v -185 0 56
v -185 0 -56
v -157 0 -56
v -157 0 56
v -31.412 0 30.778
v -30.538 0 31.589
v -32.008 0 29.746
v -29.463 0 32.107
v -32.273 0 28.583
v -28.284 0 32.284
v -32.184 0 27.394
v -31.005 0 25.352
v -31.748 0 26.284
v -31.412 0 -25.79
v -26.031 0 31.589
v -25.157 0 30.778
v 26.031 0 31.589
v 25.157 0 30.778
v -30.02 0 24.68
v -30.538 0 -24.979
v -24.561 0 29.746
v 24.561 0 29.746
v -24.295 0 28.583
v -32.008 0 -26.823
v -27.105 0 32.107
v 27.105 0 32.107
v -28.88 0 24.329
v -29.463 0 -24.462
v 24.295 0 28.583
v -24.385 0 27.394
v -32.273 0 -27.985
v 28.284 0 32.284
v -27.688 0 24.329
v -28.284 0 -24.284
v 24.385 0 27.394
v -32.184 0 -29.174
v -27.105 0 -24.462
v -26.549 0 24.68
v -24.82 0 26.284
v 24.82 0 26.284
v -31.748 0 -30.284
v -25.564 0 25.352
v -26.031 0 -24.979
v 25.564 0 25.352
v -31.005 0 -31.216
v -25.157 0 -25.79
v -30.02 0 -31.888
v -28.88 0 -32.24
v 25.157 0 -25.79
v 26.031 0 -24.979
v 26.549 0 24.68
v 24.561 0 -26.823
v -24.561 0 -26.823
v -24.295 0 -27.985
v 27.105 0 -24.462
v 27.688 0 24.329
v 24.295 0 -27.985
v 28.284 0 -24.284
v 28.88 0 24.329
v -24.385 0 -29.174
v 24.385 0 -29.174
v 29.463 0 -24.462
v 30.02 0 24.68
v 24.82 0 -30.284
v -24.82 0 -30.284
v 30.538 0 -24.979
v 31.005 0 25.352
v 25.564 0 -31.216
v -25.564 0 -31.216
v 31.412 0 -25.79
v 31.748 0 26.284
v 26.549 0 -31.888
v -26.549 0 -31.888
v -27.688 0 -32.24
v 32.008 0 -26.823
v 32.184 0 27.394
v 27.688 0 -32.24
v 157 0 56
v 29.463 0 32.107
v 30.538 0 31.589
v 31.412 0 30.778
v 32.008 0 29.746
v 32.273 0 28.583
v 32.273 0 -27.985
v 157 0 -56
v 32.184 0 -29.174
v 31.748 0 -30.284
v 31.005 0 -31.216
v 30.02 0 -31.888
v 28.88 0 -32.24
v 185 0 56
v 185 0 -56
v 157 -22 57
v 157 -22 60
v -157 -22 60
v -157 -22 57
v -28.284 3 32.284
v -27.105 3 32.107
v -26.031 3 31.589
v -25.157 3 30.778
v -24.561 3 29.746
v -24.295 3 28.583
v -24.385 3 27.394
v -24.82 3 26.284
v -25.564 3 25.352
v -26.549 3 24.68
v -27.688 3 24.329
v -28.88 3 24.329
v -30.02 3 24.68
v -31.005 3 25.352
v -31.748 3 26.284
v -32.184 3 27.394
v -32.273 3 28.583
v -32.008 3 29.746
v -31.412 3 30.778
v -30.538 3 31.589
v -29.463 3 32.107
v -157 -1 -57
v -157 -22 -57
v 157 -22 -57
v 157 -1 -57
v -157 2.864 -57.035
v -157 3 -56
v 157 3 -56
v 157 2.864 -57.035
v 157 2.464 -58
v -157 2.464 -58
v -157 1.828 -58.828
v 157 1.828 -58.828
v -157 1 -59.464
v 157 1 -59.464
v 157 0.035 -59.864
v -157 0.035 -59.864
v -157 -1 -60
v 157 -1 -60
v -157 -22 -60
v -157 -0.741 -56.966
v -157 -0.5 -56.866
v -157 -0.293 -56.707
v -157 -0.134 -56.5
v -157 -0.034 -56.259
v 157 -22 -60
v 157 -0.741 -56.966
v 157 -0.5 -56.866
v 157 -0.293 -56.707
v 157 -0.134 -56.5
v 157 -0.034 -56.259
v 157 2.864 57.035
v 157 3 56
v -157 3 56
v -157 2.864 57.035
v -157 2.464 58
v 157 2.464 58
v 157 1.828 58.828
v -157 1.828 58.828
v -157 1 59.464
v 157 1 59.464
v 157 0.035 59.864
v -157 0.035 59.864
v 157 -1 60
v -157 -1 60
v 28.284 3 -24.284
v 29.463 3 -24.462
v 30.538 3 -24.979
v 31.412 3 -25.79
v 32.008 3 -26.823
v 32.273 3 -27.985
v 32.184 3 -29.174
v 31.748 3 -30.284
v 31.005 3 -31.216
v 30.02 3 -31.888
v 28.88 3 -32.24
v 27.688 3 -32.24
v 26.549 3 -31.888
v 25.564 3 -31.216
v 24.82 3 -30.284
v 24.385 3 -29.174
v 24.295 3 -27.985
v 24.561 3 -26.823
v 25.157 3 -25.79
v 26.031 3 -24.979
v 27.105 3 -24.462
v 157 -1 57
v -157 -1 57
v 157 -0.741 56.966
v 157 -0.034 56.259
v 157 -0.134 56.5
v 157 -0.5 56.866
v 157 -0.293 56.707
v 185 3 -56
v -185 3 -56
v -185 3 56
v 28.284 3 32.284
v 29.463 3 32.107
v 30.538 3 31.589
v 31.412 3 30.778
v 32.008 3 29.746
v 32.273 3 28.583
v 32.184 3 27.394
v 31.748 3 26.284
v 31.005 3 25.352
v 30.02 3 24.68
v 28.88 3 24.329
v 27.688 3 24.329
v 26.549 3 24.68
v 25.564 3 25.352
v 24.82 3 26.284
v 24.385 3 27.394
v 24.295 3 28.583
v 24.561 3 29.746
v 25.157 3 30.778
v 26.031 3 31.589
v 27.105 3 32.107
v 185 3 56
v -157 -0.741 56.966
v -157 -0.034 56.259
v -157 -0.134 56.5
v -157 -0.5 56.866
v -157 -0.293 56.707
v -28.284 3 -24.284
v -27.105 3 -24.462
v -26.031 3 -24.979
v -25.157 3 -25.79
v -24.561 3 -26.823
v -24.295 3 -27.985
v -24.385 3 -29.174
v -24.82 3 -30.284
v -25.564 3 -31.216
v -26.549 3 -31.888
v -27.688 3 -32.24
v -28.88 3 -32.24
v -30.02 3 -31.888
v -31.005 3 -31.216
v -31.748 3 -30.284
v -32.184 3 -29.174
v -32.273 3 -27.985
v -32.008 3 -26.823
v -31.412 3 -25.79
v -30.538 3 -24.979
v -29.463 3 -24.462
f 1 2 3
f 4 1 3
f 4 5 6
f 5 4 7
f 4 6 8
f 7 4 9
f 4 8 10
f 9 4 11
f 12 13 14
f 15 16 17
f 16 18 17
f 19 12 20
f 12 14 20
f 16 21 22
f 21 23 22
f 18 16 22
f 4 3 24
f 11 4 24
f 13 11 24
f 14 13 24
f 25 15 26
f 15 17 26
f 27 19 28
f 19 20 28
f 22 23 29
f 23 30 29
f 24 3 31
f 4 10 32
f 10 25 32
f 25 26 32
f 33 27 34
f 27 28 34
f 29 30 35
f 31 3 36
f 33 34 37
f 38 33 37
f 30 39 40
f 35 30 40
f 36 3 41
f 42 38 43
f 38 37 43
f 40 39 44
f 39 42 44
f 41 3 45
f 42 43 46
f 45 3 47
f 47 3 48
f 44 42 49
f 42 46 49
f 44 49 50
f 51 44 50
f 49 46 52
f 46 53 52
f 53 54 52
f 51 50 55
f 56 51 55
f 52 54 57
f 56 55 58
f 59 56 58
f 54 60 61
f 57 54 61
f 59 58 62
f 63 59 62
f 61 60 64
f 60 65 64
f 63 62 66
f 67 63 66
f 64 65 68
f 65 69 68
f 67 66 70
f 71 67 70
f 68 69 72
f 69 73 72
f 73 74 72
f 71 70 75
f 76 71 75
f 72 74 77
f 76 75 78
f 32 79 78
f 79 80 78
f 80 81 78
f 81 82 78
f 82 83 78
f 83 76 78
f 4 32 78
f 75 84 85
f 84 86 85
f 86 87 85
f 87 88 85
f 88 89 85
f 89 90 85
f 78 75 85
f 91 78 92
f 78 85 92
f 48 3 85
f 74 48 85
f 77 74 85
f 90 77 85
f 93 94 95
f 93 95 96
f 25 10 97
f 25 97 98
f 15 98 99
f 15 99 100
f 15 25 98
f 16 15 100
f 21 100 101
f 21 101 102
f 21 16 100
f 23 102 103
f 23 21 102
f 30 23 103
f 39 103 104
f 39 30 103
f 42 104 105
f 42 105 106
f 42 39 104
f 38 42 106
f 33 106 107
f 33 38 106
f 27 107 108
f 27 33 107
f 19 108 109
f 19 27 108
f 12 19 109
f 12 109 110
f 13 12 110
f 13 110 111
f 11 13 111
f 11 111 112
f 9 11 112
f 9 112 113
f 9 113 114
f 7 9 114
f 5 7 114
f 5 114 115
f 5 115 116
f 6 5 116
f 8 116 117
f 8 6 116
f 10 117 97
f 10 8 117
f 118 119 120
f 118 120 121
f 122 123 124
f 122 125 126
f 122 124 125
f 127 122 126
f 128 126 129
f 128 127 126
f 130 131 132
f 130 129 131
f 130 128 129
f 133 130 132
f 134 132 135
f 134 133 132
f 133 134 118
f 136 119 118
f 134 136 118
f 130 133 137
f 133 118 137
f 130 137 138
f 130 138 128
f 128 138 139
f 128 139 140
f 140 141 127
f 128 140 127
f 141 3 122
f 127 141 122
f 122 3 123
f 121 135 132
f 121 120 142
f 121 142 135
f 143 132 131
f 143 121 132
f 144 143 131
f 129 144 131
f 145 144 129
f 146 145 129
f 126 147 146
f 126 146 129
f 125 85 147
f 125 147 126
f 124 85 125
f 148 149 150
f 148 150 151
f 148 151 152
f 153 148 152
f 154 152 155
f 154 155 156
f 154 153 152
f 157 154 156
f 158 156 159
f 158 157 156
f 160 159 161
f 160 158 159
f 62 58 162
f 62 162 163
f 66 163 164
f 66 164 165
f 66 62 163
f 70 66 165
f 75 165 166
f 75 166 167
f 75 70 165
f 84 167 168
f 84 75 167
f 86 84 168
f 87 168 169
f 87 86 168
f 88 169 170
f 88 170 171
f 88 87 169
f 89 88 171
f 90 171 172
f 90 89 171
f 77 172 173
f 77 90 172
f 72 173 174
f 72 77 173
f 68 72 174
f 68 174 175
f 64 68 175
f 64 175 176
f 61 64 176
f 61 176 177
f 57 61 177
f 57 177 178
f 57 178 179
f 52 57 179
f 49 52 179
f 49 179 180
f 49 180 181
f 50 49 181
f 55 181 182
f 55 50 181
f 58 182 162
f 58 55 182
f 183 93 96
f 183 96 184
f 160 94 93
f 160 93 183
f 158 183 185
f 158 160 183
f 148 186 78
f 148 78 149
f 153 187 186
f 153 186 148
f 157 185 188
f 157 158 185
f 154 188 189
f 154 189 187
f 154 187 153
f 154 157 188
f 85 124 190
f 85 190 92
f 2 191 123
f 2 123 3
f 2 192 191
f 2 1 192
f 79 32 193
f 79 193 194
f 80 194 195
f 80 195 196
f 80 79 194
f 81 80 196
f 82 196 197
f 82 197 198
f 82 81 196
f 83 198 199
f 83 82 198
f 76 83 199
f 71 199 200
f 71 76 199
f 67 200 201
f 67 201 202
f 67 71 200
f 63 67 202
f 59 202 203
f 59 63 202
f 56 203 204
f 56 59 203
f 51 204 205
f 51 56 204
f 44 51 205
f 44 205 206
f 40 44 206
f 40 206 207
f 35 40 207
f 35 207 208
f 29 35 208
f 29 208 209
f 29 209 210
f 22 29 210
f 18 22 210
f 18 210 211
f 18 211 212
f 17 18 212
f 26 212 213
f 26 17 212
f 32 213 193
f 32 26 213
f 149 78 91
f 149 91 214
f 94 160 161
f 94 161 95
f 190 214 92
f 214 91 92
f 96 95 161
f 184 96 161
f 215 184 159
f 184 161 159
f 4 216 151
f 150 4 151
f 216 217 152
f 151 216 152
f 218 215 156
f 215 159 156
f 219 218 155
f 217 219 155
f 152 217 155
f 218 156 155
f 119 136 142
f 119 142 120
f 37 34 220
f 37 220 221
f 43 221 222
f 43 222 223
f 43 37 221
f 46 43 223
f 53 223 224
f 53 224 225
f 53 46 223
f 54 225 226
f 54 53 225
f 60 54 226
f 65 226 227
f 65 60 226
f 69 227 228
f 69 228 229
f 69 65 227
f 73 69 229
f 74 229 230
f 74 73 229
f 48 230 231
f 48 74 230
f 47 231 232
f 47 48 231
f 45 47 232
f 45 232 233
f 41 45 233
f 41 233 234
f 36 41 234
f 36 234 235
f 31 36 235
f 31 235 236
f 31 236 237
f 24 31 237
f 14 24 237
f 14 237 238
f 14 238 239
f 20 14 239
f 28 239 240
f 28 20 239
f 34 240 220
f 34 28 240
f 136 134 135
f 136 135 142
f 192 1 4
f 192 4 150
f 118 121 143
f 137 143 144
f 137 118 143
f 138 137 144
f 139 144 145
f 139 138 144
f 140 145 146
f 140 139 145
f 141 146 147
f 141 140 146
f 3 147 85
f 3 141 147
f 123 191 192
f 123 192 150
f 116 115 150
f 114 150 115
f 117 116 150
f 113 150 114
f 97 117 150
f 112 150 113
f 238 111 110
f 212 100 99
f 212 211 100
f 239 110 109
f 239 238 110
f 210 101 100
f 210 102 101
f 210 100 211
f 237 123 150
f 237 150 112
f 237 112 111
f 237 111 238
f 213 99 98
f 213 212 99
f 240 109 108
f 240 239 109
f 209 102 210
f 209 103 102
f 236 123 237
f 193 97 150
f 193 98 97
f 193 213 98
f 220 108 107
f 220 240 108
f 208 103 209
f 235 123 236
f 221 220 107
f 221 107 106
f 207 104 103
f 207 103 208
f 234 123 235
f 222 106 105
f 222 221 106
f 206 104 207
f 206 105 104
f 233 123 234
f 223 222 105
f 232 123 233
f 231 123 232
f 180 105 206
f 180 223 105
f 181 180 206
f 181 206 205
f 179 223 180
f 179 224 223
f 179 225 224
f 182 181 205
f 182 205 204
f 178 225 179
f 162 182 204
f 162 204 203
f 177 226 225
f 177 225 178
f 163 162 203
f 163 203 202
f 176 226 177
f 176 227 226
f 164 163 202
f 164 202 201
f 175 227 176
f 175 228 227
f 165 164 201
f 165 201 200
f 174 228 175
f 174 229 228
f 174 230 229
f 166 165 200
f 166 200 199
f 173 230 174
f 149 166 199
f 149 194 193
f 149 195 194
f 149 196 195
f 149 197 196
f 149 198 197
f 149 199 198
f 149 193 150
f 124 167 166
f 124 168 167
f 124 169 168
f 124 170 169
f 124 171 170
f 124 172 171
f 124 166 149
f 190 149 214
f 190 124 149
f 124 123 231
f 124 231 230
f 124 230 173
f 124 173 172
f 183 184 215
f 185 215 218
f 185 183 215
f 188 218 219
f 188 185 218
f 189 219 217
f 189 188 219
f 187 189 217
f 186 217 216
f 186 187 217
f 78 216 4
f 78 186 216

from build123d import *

# Parameters (mm, degrees)
SKETCH1_W                      = 370
SKETCH1_H                      = 114
SKETCH1_R                      = 4
BOSS_EXTRUDE1_DEPTH            = 3
EDGE_FLANGE1_STRIP_W           = 14
EDGE_FLANGE1_STRIP_H           = 3
EDGE_FLANGE1_STRIP_CUT_DEPTH   = 370
EDGE_FLANGE1_STRIP_2_W         = 14
EDGE_FLANGE1_STRIP_2_H         = 3
EDGE_FLANGE1_STRIP_CUT_2_DEPTH = 370
EDGE_FLANGE1_DEPTH             = 370
EDGE_FLANGE1_BEND_DEPTH        = 370
CUT_EXTRUDE2_START             = -185
CUT_EXTRUDE2_DEPTH             = 28
CUT_EXTRUDE2_START_2           = 157
CUT_EXTRUDE2_2_DEPTH           = 28


# Read off the part's stored shape, not the designer's step: Cut-Extrude2
# Sheet-metal steps are written as plain solids
with BuildPart() as part:
    # Sketch1 → Boss-Extrude1 (new body)
    with BuildSketch(Plane(origin=(0, 0, 0), x_dir=(1, 0, 0), z_dir=(0, 1, 0))):
        Rectangle(SKETCH1_W, SKETCH1_H)
        with Locations(Location((-28.284271247, 28.284271247, 0), (0, 0, 270))):
            Circle(SKETCH1_R, mode=Mode.SUBTRACT)
        with Locations(Location((28.284271247, 28.284271247, 0), (0, 0, 270))):
            Circle(SKETCH1_R, mode=Mode.SUBTRACT)
        with Locations(Location((28.284271247, -28.284271247, 0), (0, 0, 270))):
            Circle(SKETCH1_R, mode=Mode.SUBTRACT)
        with Locations(Location((-28.284271247, -28.284271247, 0), (0, 0, 270))):
            Circle(SKETCH1_R, mode=Mode.SUBTRACT)
    extrude(amount=BOSS_EXTRUDE1_DEPTH)

    # Edge-Flange1 strip (across the edge) → Edge-Flange1 strip cut (cut)
    with BuildSketch(Plane(origin=(185, 0, 57), x_dir=(0, 0, -1), z_dir=(-1, 0, 0))):
        with Locations((-6, -1.5)):
            Rectangle(EDGE_FLANGE1_STRIP_W, EDGE_FLANGE1_STRIP_H)
    extrude(amount=EDGE_FLANGE1_STRIP_CUT_DEPTH, mode=Mode.SUBTRACT)

    # Edge-Flange1 strip 2 (across the edge) → Edge-Flange1 strip cut 2 (cut)
    with BuildSketch(Plane(origin=(-185, 0, -57), x_dir=(0, 0, 1), z_dir=(1, 0, 0))):
        with Locations((-6, -1.5)):
            Rectangle(EDGE_FLANGE1_STRIP_2_W, EDGE_FLANGE1_STRIP_2_H)
    extrude(amount=EDGE_FLANGE1_STRIP_CUT_2_DEPTH, mode=Mode.SUBTRACT)

    # Edge-Flange1 section (across the edge) → Edge-Flange1 (add)
    with BuildSketch(Plane(origin=(185, 0, 57), x_dir=(0, 0, -1), z_dir=(-1, 0, 0))):
        with BuildLine():
            Line((-3, 1), (-3, 22))
            Line((-3, 22), (0, 22))
            Line((0, 22), (0, 1))
            ThreePointArc((0, 1), (0.292893219, 0.292893219), (1, 0))
            Line((1, 0), (1, -3))
            ThreePointArc((1, -3), (-1.828427125, -1.828427125), (-3, 1))
        make_face()
    extrude(amount=EDGE_FLANGE1_DEPTH)

    # Edge-Flange1 section 2 (across the edge) → Edge-Flange1 bend (add)
    with BuildSketch(Plane(origin=(-185, 0, -57), x_dir=(0, 0, 1), z_dir=(1, 0, 0))):
        with BuildLine():
            Line((-3, 1), (-3, 22))
            Line((-3, 22), (0, 22))
            Line((0, 22), (0, 1))
            ThreePointArc((0, 1), (0.292893219, 0.292893219), (1, 0))
            Line((1, 0), (1, -3))
            ThreePointArc((1, -3), (-1.828427125, -1.828427125), (-3, 1))
        make_face()
    extrude(amount=EDGE_FLANGE1_BEND_DEPTH)

    # Cut-Extrude2 outline → Cut-Extrude2 (cut)
    with BuildSketch(Plane.YZ.offset(CUT_EXTRUDE2_START)):
        with BuildLine():
            ThreePointArc((-1, -60), (1.828427125, -58.828427125), (3, -56))
            Line((3, -56), (0, -56))
            ThreePointArc((0, -56), (-0.292893219, -56.707106781), (-1, -57))
            Line((-1, -57), (-22, -57))
            Line((-22, -57), (-22, -60))
            Line((-22, -60), (-1, -60))
        make_face()
        with BuildLine():
            ThreePointArc((-1, 57), (-0.292893219, 56.707106781), (0, 56))
            Line((0, 56), (3, 56))
            ThreePointArc((3, 56), (1.828427125, 58.828427125), (-1, 60))
            Line((-1, 60), (-22, 60))
            Line((-22, 60), (-22, 57))
            Line((-22, 57), (-1, 57))
        make_face()
    extrude(amount=CUT_EXTRUDE2_DEPTH, mode=Mode.SUBTRACT)

    # Cut-Extrude2 2 outline → Cut-Extrude2 2 (cut)
    with BuildSketch(Plane.YZ.offset(CUT_EXTRUDE2_START_2)):
        with BuildLine():
            ThreePointArc((-1, -60), (1.828427125, -58.828427125), (3, -56))
            Line((3, -56), (0, -56))
            ThreePointArc((0, -56), (-0.292893219, -56.707106781), (-1, -57))
            Line((-1, -57), (-22, -57))
            Line((-22, -57), (-22, -60))
            Line((-22, -60), (-1, -60))
        make_face()
        with BuildLine():
            ThreePointArc((-1, 57), (-0.292893219, 56.707106781), (0, 56))
            Line((0, 56), (3, 56))
            ThreePointArc((3, 56), (1.828427125, 58.828427125), (-1, 60))
            Line((-1, 60), (-22, 60))
            Line((-22, 60), (-22, 57))
            Line((-22, 57), (-1, 57))
        make_face()
    extrude(amount=CUT_EXTRUDE2_2_DEPTH, mode=Mode.SUBTRACT)


solid = part.part
